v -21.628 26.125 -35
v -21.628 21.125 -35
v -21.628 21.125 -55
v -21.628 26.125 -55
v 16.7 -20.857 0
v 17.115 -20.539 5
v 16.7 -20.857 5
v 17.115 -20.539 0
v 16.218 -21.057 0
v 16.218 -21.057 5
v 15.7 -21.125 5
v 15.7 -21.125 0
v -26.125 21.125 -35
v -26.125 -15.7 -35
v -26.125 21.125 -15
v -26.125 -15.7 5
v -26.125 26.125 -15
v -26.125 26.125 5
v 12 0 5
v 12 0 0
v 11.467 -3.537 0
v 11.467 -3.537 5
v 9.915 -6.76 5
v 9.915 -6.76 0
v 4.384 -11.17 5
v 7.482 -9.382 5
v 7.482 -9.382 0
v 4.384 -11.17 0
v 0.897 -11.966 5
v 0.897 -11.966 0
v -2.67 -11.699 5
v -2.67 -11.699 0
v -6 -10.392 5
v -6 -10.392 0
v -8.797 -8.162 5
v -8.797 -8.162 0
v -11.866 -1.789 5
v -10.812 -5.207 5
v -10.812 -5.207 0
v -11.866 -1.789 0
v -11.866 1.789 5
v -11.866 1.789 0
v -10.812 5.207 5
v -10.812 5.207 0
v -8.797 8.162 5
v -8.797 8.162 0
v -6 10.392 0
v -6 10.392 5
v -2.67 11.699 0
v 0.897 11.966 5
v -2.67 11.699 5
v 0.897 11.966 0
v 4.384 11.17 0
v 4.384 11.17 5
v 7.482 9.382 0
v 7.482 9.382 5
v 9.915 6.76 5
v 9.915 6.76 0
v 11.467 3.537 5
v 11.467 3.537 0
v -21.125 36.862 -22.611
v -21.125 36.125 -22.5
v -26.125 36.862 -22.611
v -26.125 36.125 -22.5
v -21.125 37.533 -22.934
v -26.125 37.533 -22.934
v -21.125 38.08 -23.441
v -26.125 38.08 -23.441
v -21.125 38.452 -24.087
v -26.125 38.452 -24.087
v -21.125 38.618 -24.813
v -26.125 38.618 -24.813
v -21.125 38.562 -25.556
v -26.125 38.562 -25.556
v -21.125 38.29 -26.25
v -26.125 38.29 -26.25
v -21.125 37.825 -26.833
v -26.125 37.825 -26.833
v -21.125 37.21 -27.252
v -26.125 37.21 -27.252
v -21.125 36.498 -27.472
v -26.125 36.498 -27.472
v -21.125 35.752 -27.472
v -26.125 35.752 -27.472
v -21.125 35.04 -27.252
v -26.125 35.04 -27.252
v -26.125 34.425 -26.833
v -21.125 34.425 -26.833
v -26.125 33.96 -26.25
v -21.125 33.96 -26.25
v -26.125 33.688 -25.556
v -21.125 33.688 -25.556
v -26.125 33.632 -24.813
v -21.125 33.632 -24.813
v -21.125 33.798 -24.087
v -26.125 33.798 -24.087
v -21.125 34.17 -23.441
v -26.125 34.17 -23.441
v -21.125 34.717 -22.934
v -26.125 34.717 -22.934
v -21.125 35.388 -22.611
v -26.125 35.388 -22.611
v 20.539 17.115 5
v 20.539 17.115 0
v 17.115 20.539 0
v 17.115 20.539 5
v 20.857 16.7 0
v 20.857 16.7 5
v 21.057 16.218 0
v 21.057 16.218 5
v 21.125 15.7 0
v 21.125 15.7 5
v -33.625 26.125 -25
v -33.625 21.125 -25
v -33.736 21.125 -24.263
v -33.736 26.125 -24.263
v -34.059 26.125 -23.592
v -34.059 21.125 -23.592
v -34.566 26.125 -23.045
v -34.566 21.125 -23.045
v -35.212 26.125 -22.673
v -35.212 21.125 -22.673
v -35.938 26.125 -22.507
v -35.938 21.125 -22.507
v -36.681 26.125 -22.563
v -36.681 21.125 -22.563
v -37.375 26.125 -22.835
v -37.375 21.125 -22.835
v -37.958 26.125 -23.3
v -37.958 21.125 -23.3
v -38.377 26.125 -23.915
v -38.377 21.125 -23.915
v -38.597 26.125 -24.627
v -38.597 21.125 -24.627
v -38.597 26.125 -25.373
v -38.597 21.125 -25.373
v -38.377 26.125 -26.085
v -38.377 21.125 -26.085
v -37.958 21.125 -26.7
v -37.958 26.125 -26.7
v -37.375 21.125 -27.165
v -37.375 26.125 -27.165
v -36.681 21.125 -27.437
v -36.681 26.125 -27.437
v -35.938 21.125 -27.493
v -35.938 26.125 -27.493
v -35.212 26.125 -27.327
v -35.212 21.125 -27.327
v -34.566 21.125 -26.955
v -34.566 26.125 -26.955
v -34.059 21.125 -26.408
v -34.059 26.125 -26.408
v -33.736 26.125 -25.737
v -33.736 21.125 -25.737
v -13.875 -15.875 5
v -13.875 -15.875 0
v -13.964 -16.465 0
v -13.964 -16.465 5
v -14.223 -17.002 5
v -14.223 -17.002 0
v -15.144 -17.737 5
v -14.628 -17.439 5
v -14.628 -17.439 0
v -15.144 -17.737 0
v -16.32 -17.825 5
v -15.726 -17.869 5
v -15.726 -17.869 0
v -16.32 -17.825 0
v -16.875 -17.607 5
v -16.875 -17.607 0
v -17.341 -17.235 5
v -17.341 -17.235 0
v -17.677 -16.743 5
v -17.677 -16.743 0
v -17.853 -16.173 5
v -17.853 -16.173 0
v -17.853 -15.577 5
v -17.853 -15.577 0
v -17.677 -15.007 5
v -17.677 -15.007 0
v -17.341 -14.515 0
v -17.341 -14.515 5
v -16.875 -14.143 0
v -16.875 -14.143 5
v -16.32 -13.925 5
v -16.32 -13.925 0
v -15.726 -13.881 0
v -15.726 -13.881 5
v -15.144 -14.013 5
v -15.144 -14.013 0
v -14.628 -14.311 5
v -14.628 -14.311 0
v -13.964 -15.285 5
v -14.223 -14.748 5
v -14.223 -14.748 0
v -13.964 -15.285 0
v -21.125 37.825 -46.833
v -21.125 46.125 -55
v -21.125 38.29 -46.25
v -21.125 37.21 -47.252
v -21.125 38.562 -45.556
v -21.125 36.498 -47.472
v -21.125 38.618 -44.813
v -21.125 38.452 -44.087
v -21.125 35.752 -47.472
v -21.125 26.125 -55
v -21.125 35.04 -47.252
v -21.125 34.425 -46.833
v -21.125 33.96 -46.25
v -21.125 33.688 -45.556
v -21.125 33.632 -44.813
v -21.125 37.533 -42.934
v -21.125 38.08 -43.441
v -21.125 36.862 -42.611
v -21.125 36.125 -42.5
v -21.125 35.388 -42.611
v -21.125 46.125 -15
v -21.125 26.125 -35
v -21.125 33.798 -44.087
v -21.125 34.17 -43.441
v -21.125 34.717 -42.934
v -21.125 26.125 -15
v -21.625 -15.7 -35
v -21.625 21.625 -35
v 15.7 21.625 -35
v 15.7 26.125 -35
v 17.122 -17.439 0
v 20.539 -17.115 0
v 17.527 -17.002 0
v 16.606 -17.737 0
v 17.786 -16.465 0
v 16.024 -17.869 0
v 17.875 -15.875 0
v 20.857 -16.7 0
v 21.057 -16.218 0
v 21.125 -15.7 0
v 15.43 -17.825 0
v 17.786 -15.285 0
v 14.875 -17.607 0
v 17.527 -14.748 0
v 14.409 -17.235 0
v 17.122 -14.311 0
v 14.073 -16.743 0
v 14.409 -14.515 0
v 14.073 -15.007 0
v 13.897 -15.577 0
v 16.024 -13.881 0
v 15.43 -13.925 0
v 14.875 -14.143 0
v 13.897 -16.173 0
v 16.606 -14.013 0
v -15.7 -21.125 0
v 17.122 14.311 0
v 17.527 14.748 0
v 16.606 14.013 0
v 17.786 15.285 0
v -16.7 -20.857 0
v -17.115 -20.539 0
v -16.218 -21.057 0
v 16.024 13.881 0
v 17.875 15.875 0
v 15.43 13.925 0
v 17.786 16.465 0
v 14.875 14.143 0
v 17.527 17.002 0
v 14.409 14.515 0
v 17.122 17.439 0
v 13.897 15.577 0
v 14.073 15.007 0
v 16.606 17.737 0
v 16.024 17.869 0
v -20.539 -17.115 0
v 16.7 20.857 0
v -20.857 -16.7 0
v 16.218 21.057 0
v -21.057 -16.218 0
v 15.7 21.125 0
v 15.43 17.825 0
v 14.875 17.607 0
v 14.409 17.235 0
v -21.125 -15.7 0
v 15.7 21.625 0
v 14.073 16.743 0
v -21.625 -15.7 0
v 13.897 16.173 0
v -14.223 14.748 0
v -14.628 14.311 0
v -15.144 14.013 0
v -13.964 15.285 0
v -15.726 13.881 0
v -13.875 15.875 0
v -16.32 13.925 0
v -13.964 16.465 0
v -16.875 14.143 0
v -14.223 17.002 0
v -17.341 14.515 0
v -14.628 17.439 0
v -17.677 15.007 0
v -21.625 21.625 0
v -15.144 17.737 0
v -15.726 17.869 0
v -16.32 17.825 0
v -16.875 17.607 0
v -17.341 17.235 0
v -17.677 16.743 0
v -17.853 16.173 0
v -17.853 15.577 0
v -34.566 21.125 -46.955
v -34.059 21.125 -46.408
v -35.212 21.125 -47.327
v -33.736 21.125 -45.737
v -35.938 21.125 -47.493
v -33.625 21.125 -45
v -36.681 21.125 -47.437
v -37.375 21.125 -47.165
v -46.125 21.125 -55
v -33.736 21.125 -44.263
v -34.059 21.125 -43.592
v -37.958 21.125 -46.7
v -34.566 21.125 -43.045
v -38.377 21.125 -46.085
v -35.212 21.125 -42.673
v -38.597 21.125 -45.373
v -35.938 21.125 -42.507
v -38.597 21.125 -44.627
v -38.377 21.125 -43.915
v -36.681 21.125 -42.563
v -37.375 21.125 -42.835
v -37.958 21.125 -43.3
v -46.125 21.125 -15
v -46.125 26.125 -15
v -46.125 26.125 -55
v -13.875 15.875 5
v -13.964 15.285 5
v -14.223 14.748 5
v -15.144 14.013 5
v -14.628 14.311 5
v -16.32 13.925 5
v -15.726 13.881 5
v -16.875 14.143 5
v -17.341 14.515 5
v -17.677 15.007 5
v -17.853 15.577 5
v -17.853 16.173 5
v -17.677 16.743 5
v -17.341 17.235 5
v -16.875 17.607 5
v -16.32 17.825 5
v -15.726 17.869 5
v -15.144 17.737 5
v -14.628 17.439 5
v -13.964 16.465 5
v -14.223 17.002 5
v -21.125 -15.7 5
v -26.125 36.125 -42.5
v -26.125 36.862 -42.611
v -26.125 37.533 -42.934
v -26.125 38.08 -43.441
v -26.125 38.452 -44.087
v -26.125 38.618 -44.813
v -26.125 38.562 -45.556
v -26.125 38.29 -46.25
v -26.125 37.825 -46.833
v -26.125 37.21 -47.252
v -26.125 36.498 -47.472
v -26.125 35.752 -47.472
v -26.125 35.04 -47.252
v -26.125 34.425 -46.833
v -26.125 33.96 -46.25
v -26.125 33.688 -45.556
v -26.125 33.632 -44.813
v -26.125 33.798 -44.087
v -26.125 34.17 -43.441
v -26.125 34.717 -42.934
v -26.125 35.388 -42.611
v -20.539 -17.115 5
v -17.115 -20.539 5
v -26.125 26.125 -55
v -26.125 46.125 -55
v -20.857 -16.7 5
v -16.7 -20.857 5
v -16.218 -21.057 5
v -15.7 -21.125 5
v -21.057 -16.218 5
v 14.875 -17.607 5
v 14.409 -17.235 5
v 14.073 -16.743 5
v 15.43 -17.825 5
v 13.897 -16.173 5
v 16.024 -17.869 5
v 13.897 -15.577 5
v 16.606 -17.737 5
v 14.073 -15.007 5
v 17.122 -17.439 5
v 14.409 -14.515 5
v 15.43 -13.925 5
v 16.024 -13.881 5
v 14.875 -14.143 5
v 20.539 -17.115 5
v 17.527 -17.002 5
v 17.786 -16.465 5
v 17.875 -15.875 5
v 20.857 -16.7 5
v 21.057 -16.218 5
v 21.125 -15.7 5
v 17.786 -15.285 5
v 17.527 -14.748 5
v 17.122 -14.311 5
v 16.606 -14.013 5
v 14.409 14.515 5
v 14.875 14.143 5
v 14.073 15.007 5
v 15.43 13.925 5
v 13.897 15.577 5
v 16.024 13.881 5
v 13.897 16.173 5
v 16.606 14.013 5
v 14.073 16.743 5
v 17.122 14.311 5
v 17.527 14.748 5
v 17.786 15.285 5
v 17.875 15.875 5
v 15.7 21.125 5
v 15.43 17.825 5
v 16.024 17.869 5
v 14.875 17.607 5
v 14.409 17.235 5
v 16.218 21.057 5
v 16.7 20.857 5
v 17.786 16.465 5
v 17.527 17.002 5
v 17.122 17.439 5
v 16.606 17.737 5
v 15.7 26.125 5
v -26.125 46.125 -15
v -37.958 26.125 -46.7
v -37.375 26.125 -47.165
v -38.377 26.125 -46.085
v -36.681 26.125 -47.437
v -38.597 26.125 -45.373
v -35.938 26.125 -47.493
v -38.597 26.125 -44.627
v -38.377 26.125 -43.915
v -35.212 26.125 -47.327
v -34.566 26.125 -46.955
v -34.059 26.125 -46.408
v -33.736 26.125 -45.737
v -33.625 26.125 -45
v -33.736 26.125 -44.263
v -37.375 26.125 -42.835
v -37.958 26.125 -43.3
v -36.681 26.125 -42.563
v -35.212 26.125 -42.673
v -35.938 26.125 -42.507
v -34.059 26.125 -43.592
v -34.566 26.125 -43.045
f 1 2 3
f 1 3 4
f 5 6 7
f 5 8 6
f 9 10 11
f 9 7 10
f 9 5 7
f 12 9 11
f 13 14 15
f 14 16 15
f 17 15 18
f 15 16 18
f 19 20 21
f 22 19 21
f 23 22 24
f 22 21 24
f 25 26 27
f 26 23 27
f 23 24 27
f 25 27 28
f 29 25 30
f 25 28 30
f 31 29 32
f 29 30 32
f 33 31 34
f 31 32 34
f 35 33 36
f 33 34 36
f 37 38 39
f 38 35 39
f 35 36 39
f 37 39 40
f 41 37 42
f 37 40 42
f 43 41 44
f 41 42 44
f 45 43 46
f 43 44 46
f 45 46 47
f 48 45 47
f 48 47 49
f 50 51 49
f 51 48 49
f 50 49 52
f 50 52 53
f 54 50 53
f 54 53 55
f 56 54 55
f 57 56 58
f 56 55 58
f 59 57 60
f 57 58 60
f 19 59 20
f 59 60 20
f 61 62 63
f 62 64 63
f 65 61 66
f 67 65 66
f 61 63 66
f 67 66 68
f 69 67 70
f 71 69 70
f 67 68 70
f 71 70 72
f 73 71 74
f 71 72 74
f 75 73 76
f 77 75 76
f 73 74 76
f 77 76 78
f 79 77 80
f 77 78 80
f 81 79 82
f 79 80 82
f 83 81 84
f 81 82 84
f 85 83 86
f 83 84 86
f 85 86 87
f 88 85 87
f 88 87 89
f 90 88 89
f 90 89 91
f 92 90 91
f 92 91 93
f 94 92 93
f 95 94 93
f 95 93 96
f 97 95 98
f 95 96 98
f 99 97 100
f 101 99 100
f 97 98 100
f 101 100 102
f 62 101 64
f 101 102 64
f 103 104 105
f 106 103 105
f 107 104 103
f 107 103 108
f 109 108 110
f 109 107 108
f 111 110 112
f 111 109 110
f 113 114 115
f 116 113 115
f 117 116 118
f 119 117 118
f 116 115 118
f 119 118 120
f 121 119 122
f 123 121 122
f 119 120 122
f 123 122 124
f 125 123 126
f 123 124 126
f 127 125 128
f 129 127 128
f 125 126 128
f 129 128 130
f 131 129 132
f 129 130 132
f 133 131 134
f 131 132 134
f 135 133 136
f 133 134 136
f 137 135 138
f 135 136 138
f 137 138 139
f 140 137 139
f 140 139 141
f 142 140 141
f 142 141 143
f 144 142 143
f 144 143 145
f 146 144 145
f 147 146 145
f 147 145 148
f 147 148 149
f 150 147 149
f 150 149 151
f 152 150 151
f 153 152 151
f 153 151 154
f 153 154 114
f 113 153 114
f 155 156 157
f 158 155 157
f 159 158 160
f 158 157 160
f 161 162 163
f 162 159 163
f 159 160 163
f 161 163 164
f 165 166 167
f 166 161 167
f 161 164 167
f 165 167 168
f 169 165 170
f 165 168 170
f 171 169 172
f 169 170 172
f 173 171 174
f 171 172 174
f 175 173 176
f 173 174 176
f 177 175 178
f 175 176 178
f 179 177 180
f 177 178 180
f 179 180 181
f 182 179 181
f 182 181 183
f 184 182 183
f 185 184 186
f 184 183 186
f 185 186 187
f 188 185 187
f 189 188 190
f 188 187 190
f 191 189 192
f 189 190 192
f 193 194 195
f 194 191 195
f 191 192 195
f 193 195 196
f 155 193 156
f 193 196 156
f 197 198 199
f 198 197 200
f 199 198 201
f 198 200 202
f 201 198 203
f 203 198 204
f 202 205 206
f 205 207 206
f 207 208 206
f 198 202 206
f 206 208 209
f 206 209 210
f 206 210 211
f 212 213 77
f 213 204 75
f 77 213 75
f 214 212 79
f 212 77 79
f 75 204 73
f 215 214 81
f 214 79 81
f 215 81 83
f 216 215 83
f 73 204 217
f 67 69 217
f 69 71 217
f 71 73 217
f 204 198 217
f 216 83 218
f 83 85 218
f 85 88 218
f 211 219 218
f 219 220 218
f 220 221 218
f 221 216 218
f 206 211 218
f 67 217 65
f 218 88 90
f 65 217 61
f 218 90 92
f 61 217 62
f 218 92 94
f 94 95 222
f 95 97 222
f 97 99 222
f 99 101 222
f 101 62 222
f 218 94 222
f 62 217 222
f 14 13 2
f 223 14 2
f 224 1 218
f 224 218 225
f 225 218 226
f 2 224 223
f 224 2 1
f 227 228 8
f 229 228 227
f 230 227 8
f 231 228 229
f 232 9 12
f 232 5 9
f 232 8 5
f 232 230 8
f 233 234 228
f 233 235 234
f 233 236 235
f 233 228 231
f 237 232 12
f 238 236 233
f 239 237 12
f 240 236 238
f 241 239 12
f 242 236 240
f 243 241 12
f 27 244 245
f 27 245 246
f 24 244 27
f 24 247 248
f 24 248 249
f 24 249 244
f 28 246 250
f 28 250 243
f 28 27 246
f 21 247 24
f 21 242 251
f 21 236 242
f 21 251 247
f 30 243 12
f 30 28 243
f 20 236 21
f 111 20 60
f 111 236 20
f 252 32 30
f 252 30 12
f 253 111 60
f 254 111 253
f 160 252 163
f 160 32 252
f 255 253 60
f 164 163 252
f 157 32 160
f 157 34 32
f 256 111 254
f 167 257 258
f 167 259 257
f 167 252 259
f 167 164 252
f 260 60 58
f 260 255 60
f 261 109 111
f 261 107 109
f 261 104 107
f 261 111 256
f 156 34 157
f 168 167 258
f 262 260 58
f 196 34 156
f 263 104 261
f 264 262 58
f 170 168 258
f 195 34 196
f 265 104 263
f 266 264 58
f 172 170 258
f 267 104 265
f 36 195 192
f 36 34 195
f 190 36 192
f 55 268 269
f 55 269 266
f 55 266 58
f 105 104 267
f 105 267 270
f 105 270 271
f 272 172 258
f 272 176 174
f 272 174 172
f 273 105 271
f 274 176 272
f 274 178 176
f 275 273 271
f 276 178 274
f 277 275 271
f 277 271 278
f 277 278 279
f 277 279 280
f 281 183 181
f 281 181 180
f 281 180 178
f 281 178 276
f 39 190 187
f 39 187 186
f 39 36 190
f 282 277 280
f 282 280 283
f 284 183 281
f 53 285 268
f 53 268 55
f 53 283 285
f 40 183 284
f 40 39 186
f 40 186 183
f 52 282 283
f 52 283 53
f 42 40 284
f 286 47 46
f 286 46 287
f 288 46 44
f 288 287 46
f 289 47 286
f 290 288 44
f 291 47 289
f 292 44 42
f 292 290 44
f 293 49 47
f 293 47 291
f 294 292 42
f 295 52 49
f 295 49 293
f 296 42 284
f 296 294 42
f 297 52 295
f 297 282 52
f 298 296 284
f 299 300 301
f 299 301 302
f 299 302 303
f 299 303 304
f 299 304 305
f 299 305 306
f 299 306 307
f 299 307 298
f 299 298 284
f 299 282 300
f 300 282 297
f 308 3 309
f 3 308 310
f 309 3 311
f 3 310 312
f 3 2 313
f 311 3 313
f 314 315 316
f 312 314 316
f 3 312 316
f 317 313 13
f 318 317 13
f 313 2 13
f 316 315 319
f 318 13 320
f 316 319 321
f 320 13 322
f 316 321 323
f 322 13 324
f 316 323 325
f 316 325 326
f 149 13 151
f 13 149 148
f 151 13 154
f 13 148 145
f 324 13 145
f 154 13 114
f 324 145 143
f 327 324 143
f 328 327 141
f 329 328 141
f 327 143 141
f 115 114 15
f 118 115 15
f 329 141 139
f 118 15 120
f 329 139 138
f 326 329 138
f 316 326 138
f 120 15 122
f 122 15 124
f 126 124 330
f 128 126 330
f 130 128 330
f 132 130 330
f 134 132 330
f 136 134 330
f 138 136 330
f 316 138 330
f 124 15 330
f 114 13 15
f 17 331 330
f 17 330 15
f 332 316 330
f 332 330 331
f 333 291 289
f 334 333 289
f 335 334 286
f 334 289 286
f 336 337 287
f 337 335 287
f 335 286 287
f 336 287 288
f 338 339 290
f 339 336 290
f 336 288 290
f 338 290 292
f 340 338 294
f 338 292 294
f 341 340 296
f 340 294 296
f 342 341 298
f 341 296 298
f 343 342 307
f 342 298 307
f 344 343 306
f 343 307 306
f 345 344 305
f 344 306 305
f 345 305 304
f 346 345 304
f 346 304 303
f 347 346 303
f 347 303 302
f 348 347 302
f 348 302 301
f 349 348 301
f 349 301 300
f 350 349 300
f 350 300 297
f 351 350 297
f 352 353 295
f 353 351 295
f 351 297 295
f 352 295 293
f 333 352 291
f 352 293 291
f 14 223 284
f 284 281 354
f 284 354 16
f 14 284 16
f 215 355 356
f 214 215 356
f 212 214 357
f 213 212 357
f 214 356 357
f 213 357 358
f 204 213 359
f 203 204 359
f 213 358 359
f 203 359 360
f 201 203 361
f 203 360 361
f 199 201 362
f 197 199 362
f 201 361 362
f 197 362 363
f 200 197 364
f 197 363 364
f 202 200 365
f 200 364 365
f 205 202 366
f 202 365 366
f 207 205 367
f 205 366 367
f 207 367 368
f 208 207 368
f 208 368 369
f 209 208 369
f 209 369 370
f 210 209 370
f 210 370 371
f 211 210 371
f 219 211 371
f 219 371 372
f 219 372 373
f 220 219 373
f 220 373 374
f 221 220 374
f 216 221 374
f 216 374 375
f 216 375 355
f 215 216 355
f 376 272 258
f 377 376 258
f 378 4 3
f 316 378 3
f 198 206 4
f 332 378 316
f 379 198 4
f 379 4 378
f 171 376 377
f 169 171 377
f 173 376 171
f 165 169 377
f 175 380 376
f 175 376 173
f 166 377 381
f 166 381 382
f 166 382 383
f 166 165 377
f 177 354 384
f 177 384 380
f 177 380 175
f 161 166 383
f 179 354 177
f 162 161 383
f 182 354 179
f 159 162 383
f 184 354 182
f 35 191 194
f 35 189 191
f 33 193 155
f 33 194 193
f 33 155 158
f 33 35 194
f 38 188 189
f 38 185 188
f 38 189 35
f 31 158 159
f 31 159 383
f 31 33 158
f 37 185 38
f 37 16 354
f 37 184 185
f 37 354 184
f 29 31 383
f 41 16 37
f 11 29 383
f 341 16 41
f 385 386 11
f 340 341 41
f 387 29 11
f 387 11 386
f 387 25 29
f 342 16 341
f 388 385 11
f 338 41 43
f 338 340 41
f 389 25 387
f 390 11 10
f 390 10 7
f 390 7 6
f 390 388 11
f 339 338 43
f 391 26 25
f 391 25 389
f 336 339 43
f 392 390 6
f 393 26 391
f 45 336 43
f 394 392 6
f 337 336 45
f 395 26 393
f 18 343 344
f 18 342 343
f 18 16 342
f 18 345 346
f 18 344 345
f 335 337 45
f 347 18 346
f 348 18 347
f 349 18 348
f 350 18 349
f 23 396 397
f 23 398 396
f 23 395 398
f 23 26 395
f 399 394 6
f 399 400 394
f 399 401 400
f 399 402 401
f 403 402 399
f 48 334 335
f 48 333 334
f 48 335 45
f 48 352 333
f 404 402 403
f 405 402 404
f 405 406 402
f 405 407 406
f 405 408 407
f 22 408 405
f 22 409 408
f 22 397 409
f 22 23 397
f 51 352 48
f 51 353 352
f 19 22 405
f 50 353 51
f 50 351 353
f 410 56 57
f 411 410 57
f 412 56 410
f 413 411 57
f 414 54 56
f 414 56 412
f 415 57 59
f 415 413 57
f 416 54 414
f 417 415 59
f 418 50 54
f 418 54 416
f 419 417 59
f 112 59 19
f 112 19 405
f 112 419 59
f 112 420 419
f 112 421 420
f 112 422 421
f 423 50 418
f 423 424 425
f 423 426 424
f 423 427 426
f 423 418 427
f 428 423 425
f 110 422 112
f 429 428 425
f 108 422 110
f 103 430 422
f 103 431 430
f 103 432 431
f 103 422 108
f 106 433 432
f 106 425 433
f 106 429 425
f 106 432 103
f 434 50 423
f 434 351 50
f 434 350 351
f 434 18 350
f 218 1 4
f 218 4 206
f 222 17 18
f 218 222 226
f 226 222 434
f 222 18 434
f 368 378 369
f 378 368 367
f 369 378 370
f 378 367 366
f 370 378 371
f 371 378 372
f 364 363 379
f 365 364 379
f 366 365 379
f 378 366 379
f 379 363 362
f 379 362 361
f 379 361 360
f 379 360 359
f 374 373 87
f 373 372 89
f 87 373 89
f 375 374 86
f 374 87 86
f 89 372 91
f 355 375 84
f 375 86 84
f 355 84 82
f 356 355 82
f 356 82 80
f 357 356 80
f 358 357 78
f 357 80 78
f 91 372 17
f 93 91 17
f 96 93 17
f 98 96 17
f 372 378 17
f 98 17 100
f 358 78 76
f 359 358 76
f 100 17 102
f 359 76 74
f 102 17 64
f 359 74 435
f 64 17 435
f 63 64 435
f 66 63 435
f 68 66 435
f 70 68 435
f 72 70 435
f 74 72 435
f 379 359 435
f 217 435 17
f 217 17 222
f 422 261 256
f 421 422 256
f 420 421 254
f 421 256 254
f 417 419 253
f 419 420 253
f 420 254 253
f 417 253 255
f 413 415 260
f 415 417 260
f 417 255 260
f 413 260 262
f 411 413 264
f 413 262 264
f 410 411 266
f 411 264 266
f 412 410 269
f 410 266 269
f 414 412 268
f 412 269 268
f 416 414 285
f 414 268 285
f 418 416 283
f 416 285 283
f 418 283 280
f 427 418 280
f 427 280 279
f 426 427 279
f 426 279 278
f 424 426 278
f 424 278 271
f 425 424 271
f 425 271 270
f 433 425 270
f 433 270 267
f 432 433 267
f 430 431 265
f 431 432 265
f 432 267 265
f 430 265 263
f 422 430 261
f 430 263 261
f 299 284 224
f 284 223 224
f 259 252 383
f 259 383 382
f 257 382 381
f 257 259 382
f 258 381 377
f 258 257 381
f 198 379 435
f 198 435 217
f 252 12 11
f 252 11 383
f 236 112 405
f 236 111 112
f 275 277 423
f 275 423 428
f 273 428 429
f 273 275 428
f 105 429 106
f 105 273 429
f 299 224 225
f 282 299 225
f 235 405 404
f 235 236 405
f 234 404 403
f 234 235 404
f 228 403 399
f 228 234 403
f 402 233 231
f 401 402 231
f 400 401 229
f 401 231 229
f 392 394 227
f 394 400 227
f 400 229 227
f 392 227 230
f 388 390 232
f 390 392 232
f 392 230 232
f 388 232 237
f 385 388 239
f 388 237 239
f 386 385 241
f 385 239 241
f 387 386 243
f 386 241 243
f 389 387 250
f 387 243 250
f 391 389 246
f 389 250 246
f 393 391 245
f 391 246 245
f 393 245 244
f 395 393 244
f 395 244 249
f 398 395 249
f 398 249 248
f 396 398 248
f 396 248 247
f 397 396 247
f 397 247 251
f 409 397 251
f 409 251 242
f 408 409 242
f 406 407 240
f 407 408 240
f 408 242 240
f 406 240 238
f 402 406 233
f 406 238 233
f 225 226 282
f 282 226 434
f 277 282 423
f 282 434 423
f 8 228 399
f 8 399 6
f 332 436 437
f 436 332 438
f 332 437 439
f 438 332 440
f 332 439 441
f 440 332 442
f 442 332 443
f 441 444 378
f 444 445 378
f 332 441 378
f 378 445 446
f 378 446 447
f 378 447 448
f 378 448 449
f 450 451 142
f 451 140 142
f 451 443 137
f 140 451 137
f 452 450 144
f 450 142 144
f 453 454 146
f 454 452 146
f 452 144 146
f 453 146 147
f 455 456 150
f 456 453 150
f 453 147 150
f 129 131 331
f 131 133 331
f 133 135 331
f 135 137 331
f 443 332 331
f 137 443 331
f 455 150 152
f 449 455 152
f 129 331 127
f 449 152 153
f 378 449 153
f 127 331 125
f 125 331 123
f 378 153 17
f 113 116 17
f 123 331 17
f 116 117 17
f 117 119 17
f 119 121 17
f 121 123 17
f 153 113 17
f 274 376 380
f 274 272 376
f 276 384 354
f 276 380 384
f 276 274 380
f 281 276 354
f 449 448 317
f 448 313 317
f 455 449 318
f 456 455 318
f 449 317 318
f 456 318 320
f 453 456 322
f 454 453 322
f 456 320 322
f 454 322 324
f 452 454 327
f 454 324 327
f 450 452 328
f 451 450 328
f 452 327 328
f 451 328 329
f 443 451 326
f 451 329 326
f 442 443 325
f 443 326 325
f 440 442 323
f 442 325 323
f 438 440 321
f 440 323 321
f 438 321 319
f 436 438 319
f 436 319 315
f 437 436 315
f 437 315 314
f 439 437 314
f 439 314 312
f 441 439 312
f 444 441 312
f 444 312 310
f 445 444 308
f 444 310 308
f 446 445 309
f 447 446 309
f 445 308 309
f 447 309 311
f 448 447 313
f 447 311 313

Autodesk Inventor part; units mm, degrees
ref_plane "YZ Plane" through (0, 0, 0) normal (1, 0, 0) x (0, 1, 0)
ref_plane "XZ Plane" through (0, 0, 0) normal (0, 1, 0) x (-1, 0, 0)
ref_plane "XY Plane" through (0, 0, 0) normal (0, 0, 1) x (1, 0, 0)
sketch "Sketch1" plane through (0, 0, 0) normal (0, 0, 1) x (1, 0, 0)
  arc A0 (-20.5392, 17.1146) -> (-21.125, 15.7004) centre (-19.125, 15.7004) ccw projected
  line L0 (-21.125, -15.7004) -> (-21.125, 15.7004) projected
  arc A1 (-21.125, -15.7004) -> (-20.5392, -17.1146) centre (-19.125, -15.7004) ccw projected
  line L1 (-20.5392, -17.1146) -> (-17.1146, -20.5392) projected
  arc A2 (-17.1146, -20.5392) -> (-15.7004, -21.125) centre (-15.7004, -19.125) ccw projected
  line L2 (15.7004, -21.125) -> (-15.7004, -21.125) projected
  arc A3 (15.7004, -21.125) -> (17.1146, -20.5392) centre (15.7004, -19.125) ccw projected
  line L3 (20.5392, -17.1146) -> (17.1146, -20.5392) projected
  arc A4 (20.5392, -17.1146) -> (21.125, -15.7004) centre (19.125, -15.7004) ccw projected
  line L4 (21.125, 15.7004) -> (21.125, -15.7004) projected
  arc A5 (21.125, 15.7004) -> (20.5392, 17.1146) centre (19.125, 15.7004) ccw projected
  line L5 (20.5392, 17.1146) -> (17.1146, 20.5392) projected
  arc A6 (17.1146, 20.5392) -> (15.7004, 21.125) centre (15.7004, 19.125) ccw projected
  line L6 (-15.7004, 21.125) -> (15.7004, 21.125) projected
  arc A7 (-15.7004, 21.125) -> (-17.1146, 20.5392) centre (-15.7004, 19.125) ccw projected
  line L7 (-20.5392, 17.1146) -> (-17.1146, 20.5392) projected
  circle A8 centre (0, 0) radius 16 projected
  circle A9 centre (-15.875, -15.875) radius 1.625 projected
  circle A10 centre (15.875, 15.875) radius 1.625 projected
  circle A11 centre (-15.875, 15.875) radius 1.625 projected
  circle A12 centre (15.875, -15.875) radius 1.625 projected
  circle A13 centre (0, 0) radius 12
  circle A14 centre (-15.875, 15.875) radius 2
  circle A15 centre (15.875, 15.875) radius 2
  circle A16 centre (15.875, -15.875) radius 2
  circle A17 centre (-15.875, -15.875) radius 2
  point P0 (0, 0)
  dimension "d0" = 24
  dimension "d1" = 4
  dimension "d2" = 4
  dimension "d3" = 4
  dimension "d4" = 4
extrude "Extrusion1" add sketch "Sketch1" along normal blind 5 contours L7 A7 L6 A6 L5 A5 L4 A4 L3 A3 L2 A2 L1 A1 L0 A0 | A8
sketch "Sketch3" plane through (0, 0, 5) normal (0, 0, 1) x (1, 0, 0)
  line L0 (-15.7004, 21.125) -> (15.7004, 21.125) projected
  line L1 (15.7004, 21.125) -> (-46.125, 21.125)
  line L2 (-46.125, 21.125) -> (-46.125, 26.125)
  line L3 (-46.125, 26.125) -> (15.7004, 26.125)
  line L4 (15.7004, 26.125) -> (15.7004, 21.125)
  line L5 (-21.125, 15.7004) -> (-21.125, -15.7004) projected
  line L6 (-21.125, -15.7004) -> (-26.125, -15.7004)
  line L7 (-26.125, -15.7004) -> (-26.125, 46.125)
  line L8 (-26.125, 46.125) -> (-21.125, 46.125)
  line L9 (-21.125, 46.125) -> (-21.125, -15.7004)
  point P0 (0, 0)
  dimension "d11" = 5
  dimension "d12" = 5
  dimension "d13" = 20
  dimension "d14" = 20
extrude "Extrusion3" add sketch "Sketch3" against normal blind 40
sketch "Sketch4" plane through (0, 0, 5) normal (0, 0, 1) x (1, 0, 0)
  arc A0 (-15.7004, 21.125) -> (-17.1146, 20.5392) centre (-15.7004, 19.125) ccw projected
  line L0 (-17.1146, 20.5392) -> (-20.5392, 17.1146) projected
  arc A1 (-20.5392, 17.1146) -> (-21.125, 15.7004) centre (-19.125, 15.7004) ccw projected
  line L1 (-21.125, 21.125) -> (-21.125, 15.7004) projected
  line L2 (-15.7004, 21.125) -> (-21.125, 21.125) projected
  circle A2 centre (0, 0) radius 12 projected
  circle A3 centre (-15.875, -15.875) radius 2 projected
  circle A4 centre (15.875, -15.875) radius 2 projected
  circle A5 centre (15.875, 15.875) radius 2 projected
  circle A6 centre (-15.875, 15.875) radius 2 projected
  line L3 (15.7004, 26.125) -> (15.7004, 21.125) projected
  line L4 (-21.125, 26.125) -> (15.7004, 26.125) projected
  line L5 (-21.125, 46.125) -> (-21.125, 26.125) projected
  line L6 (-26.125, 46.125) -> (-21.125, 46.125) projected
  line L7 (-26.125, 26.125) -> (-26.125, 46.125) projected
  line L8 (-46.125, 26.125) -> (-26.125, 26.125) projected
  line L9 (-46.125, 21.125) -> (-46.125, 26.125) projected
  line L10 (-26.125, 21.125) -> (-46.125, 21.125) projected
  line L11 (-26.125, -15.7004) -> (-26.125, 21.125) projected
  line L12 (-21.125, -15.7004) -> (-26.125, -15.7004) projected
  arc A7 (-21.125, -15.7004) -> (-20.5392, -17.1146) centre (-19.125, -15.7004) ccw projected
  line L13 (-20.5392, -17.1146) -> (-17.1146, -20.5392) projected
  arc A8 (-17.1146, -20.5392) -> (-15.7004, -21.125) centre (-15.7004, -19.125) ccw projected
  line L14 (-15.7004, -21.125) -> (15.7004, -21.125) projected
  arc A9 (15.7004, -21.125) -> (17.1146, -20.5392) centre (15.7004, -19.125) ccw projected
  line L15 (17.1146, -20.5392) -> (20.5392, -17.1146) projected
  arc A10 (20.5392, -17.1146) -> (21.125, -15.7004) centre (19.125, -15.7004) ccw projected
  line L16 (21.125, -15.7004) -> (21.125, 15.7004) projected
  arc A11 (21.125, 15.7004) -> (20.5392, 17.1146) centre (19.125, 15.7004) ccw projected
  line L17 (20.5392, 17.1146) -> (17.1146, 20.5392) projected
  arc A12 (17.1146, 20.5392) -> (15.7004, 21.125) centre (15.7004, 19.125) ccw projected
  point P0 (0, 0)
extrude "Extrusion4" add sketch "Sketch4" against normal blind 5 contours A0 L0 A1 L1 L2
sketch "Sketch11" plane through (0, 0, 5) normal (0, 0, 1) x (1, 0, 0)
  line L0 (-26.125, 26.125) -> (-26.125, 46.125) projected
  line L1 (-26.125, 26.125) -> (-13.6996, 26.125)
  line L2 (-13.6996, 26.125) -> (-13.6996, 46.125)
  line L3 (-13.6996, 46.125) -> (-26.125, 46.125)
  line L4 (-26.125, 46.125) -> (-26.125, 26.125)
  line L5 (-46.125, 21.125) -> (-46.125, 26.125) projected
  line L6 (-46.125, 26.125) -> (-26.125, 26.125)
  line L7 (-26.125, 26.125) -> (-26.125, 13.3287)
  line L8 (-26.125, 13.3287) -> (-46.125, 13.3287)
  line L9 (-46.125, 13.3287) -> (-46.125, 26.125)
  point P0 (0, 0)
extrude "Extrusion9" cut sketch "Sketch11" against normal blind 20
sketch "Sketch7" plane through (0, 0, -35) normal (0, 0, -1) x (-1, 0, 0)
  line L0 (21.625, 21.625) -> (-23.2924, 21.625)
  line L1 (-23.2924, 21.625) -> (-23.2924, -21.9013)
  line L2 (-23.2924, -21.9013) -> (21.625, -21.9013)
  line L3 (21.625, -21.9013) -> (21.625, 21.625)
  line L4 (-15.7004, 21.125) -> (21.125, 21.125) projected
  line L5 (21.125, 21.125) -> (21.125, -15.7004) projected
  point P0 (0, 0)
  dimension "d35" = 0.5
  dimension "d36" = 0.5
extrude "Extrusion7" cut sketch "Sketch7" against normal blind 35
sketch "Sketch12" plane through (0, 0, -35) normal (0, 0, -1) x (-1, 0, 0)
  line L0 (46.125, 21.125) -> (46.125, 26.125) projected
  line L1 (26.125, 26.125) -> (-15.7004, 26.125) projected
  line L2 (46.125, 21.125) -> (21.6284, 21.125)
  line L3 (21.6284, 21.125) -> (21.6284, 26.125)
  line L4 (21.6284, 26.125) -> (46.125, 26.125)
  line L5 (46.125, 26.125) -> (46.125, 21.125)
  line L6 (26.125, 46.125) -> (21.125, 46.125) projected
  line L7 (-15.7004, 21.625) -> (21.625, 21.625) projected
  line L8 (26.125, 46.125) -> (21.125, 46.125)
  line L9 (21.125, 46.125) -> (21.125, 21.625)
  line L10 (21.125, 21.625) -> (26.125, 21.625)
  line L11 (26.125, 21.625) -> (26.125, 46.125)
  point P0 (0, 0)
  point P1 (21.125, 26.125)
  dimension "d54" = 5
  dimension "d55" = 5
  dimension "d56" = 4.5
  dimension "d57" = 0.5
extrude "Extrusion10" add sketch "Sketch12" along normal blind 20 contours L2 L3 L10 L11 L4 L0 | L11 L10 L3 L1 | L1 L9 L6 L11
sketch "Sketch13" plane through (-46.125, 21.125, -15) normal (0, -1, 0) x (1, 0, 0)
  circle A0 centre (10, -30) radius 2.5
  circle A1 centre (10, -10) radius 2.5
  line L0 (24.4966, -40) -> (0, -40) projected
  line L1 (0, 0) -> (0, -40) projected
  point P0 (46.125, 15)
  dimension "d60" = 10
  dimension "d61" = 10
  dimension "d62" = 5
  dimension "d63" = 5
  dimension "d64" = 20
  dimension "d65" = 10
extrude "Extrusion11" cut sketch "Sketch13" against normal blind 20
sketch "Sketch14" plane through (-26.125, 26.125, -15) normal (-1, 0, 0) x (0, 0, 1)
  circle A0 centre (-10, 10) radius 2.5
  circle A1 centre (-30, 10) radius 2.5
  line L0 (0, 0) -> (0, 20) projected
  line L1 (0, 20) -> (-40, 20) projected
  point P0 (15, -26.125)
  dimension "d68" = 10
  dimension "d69" = 10
  dimension "d70" = 20
  dimension "d71" = 10
  dimension "d72" = 5
  dimension "d73" = 5
extrude "Extrusion12" cut sketch "Sketch14" against normal blind 20
equation "\"d36\" = d35"
properties part number "StepperXYHolder"
